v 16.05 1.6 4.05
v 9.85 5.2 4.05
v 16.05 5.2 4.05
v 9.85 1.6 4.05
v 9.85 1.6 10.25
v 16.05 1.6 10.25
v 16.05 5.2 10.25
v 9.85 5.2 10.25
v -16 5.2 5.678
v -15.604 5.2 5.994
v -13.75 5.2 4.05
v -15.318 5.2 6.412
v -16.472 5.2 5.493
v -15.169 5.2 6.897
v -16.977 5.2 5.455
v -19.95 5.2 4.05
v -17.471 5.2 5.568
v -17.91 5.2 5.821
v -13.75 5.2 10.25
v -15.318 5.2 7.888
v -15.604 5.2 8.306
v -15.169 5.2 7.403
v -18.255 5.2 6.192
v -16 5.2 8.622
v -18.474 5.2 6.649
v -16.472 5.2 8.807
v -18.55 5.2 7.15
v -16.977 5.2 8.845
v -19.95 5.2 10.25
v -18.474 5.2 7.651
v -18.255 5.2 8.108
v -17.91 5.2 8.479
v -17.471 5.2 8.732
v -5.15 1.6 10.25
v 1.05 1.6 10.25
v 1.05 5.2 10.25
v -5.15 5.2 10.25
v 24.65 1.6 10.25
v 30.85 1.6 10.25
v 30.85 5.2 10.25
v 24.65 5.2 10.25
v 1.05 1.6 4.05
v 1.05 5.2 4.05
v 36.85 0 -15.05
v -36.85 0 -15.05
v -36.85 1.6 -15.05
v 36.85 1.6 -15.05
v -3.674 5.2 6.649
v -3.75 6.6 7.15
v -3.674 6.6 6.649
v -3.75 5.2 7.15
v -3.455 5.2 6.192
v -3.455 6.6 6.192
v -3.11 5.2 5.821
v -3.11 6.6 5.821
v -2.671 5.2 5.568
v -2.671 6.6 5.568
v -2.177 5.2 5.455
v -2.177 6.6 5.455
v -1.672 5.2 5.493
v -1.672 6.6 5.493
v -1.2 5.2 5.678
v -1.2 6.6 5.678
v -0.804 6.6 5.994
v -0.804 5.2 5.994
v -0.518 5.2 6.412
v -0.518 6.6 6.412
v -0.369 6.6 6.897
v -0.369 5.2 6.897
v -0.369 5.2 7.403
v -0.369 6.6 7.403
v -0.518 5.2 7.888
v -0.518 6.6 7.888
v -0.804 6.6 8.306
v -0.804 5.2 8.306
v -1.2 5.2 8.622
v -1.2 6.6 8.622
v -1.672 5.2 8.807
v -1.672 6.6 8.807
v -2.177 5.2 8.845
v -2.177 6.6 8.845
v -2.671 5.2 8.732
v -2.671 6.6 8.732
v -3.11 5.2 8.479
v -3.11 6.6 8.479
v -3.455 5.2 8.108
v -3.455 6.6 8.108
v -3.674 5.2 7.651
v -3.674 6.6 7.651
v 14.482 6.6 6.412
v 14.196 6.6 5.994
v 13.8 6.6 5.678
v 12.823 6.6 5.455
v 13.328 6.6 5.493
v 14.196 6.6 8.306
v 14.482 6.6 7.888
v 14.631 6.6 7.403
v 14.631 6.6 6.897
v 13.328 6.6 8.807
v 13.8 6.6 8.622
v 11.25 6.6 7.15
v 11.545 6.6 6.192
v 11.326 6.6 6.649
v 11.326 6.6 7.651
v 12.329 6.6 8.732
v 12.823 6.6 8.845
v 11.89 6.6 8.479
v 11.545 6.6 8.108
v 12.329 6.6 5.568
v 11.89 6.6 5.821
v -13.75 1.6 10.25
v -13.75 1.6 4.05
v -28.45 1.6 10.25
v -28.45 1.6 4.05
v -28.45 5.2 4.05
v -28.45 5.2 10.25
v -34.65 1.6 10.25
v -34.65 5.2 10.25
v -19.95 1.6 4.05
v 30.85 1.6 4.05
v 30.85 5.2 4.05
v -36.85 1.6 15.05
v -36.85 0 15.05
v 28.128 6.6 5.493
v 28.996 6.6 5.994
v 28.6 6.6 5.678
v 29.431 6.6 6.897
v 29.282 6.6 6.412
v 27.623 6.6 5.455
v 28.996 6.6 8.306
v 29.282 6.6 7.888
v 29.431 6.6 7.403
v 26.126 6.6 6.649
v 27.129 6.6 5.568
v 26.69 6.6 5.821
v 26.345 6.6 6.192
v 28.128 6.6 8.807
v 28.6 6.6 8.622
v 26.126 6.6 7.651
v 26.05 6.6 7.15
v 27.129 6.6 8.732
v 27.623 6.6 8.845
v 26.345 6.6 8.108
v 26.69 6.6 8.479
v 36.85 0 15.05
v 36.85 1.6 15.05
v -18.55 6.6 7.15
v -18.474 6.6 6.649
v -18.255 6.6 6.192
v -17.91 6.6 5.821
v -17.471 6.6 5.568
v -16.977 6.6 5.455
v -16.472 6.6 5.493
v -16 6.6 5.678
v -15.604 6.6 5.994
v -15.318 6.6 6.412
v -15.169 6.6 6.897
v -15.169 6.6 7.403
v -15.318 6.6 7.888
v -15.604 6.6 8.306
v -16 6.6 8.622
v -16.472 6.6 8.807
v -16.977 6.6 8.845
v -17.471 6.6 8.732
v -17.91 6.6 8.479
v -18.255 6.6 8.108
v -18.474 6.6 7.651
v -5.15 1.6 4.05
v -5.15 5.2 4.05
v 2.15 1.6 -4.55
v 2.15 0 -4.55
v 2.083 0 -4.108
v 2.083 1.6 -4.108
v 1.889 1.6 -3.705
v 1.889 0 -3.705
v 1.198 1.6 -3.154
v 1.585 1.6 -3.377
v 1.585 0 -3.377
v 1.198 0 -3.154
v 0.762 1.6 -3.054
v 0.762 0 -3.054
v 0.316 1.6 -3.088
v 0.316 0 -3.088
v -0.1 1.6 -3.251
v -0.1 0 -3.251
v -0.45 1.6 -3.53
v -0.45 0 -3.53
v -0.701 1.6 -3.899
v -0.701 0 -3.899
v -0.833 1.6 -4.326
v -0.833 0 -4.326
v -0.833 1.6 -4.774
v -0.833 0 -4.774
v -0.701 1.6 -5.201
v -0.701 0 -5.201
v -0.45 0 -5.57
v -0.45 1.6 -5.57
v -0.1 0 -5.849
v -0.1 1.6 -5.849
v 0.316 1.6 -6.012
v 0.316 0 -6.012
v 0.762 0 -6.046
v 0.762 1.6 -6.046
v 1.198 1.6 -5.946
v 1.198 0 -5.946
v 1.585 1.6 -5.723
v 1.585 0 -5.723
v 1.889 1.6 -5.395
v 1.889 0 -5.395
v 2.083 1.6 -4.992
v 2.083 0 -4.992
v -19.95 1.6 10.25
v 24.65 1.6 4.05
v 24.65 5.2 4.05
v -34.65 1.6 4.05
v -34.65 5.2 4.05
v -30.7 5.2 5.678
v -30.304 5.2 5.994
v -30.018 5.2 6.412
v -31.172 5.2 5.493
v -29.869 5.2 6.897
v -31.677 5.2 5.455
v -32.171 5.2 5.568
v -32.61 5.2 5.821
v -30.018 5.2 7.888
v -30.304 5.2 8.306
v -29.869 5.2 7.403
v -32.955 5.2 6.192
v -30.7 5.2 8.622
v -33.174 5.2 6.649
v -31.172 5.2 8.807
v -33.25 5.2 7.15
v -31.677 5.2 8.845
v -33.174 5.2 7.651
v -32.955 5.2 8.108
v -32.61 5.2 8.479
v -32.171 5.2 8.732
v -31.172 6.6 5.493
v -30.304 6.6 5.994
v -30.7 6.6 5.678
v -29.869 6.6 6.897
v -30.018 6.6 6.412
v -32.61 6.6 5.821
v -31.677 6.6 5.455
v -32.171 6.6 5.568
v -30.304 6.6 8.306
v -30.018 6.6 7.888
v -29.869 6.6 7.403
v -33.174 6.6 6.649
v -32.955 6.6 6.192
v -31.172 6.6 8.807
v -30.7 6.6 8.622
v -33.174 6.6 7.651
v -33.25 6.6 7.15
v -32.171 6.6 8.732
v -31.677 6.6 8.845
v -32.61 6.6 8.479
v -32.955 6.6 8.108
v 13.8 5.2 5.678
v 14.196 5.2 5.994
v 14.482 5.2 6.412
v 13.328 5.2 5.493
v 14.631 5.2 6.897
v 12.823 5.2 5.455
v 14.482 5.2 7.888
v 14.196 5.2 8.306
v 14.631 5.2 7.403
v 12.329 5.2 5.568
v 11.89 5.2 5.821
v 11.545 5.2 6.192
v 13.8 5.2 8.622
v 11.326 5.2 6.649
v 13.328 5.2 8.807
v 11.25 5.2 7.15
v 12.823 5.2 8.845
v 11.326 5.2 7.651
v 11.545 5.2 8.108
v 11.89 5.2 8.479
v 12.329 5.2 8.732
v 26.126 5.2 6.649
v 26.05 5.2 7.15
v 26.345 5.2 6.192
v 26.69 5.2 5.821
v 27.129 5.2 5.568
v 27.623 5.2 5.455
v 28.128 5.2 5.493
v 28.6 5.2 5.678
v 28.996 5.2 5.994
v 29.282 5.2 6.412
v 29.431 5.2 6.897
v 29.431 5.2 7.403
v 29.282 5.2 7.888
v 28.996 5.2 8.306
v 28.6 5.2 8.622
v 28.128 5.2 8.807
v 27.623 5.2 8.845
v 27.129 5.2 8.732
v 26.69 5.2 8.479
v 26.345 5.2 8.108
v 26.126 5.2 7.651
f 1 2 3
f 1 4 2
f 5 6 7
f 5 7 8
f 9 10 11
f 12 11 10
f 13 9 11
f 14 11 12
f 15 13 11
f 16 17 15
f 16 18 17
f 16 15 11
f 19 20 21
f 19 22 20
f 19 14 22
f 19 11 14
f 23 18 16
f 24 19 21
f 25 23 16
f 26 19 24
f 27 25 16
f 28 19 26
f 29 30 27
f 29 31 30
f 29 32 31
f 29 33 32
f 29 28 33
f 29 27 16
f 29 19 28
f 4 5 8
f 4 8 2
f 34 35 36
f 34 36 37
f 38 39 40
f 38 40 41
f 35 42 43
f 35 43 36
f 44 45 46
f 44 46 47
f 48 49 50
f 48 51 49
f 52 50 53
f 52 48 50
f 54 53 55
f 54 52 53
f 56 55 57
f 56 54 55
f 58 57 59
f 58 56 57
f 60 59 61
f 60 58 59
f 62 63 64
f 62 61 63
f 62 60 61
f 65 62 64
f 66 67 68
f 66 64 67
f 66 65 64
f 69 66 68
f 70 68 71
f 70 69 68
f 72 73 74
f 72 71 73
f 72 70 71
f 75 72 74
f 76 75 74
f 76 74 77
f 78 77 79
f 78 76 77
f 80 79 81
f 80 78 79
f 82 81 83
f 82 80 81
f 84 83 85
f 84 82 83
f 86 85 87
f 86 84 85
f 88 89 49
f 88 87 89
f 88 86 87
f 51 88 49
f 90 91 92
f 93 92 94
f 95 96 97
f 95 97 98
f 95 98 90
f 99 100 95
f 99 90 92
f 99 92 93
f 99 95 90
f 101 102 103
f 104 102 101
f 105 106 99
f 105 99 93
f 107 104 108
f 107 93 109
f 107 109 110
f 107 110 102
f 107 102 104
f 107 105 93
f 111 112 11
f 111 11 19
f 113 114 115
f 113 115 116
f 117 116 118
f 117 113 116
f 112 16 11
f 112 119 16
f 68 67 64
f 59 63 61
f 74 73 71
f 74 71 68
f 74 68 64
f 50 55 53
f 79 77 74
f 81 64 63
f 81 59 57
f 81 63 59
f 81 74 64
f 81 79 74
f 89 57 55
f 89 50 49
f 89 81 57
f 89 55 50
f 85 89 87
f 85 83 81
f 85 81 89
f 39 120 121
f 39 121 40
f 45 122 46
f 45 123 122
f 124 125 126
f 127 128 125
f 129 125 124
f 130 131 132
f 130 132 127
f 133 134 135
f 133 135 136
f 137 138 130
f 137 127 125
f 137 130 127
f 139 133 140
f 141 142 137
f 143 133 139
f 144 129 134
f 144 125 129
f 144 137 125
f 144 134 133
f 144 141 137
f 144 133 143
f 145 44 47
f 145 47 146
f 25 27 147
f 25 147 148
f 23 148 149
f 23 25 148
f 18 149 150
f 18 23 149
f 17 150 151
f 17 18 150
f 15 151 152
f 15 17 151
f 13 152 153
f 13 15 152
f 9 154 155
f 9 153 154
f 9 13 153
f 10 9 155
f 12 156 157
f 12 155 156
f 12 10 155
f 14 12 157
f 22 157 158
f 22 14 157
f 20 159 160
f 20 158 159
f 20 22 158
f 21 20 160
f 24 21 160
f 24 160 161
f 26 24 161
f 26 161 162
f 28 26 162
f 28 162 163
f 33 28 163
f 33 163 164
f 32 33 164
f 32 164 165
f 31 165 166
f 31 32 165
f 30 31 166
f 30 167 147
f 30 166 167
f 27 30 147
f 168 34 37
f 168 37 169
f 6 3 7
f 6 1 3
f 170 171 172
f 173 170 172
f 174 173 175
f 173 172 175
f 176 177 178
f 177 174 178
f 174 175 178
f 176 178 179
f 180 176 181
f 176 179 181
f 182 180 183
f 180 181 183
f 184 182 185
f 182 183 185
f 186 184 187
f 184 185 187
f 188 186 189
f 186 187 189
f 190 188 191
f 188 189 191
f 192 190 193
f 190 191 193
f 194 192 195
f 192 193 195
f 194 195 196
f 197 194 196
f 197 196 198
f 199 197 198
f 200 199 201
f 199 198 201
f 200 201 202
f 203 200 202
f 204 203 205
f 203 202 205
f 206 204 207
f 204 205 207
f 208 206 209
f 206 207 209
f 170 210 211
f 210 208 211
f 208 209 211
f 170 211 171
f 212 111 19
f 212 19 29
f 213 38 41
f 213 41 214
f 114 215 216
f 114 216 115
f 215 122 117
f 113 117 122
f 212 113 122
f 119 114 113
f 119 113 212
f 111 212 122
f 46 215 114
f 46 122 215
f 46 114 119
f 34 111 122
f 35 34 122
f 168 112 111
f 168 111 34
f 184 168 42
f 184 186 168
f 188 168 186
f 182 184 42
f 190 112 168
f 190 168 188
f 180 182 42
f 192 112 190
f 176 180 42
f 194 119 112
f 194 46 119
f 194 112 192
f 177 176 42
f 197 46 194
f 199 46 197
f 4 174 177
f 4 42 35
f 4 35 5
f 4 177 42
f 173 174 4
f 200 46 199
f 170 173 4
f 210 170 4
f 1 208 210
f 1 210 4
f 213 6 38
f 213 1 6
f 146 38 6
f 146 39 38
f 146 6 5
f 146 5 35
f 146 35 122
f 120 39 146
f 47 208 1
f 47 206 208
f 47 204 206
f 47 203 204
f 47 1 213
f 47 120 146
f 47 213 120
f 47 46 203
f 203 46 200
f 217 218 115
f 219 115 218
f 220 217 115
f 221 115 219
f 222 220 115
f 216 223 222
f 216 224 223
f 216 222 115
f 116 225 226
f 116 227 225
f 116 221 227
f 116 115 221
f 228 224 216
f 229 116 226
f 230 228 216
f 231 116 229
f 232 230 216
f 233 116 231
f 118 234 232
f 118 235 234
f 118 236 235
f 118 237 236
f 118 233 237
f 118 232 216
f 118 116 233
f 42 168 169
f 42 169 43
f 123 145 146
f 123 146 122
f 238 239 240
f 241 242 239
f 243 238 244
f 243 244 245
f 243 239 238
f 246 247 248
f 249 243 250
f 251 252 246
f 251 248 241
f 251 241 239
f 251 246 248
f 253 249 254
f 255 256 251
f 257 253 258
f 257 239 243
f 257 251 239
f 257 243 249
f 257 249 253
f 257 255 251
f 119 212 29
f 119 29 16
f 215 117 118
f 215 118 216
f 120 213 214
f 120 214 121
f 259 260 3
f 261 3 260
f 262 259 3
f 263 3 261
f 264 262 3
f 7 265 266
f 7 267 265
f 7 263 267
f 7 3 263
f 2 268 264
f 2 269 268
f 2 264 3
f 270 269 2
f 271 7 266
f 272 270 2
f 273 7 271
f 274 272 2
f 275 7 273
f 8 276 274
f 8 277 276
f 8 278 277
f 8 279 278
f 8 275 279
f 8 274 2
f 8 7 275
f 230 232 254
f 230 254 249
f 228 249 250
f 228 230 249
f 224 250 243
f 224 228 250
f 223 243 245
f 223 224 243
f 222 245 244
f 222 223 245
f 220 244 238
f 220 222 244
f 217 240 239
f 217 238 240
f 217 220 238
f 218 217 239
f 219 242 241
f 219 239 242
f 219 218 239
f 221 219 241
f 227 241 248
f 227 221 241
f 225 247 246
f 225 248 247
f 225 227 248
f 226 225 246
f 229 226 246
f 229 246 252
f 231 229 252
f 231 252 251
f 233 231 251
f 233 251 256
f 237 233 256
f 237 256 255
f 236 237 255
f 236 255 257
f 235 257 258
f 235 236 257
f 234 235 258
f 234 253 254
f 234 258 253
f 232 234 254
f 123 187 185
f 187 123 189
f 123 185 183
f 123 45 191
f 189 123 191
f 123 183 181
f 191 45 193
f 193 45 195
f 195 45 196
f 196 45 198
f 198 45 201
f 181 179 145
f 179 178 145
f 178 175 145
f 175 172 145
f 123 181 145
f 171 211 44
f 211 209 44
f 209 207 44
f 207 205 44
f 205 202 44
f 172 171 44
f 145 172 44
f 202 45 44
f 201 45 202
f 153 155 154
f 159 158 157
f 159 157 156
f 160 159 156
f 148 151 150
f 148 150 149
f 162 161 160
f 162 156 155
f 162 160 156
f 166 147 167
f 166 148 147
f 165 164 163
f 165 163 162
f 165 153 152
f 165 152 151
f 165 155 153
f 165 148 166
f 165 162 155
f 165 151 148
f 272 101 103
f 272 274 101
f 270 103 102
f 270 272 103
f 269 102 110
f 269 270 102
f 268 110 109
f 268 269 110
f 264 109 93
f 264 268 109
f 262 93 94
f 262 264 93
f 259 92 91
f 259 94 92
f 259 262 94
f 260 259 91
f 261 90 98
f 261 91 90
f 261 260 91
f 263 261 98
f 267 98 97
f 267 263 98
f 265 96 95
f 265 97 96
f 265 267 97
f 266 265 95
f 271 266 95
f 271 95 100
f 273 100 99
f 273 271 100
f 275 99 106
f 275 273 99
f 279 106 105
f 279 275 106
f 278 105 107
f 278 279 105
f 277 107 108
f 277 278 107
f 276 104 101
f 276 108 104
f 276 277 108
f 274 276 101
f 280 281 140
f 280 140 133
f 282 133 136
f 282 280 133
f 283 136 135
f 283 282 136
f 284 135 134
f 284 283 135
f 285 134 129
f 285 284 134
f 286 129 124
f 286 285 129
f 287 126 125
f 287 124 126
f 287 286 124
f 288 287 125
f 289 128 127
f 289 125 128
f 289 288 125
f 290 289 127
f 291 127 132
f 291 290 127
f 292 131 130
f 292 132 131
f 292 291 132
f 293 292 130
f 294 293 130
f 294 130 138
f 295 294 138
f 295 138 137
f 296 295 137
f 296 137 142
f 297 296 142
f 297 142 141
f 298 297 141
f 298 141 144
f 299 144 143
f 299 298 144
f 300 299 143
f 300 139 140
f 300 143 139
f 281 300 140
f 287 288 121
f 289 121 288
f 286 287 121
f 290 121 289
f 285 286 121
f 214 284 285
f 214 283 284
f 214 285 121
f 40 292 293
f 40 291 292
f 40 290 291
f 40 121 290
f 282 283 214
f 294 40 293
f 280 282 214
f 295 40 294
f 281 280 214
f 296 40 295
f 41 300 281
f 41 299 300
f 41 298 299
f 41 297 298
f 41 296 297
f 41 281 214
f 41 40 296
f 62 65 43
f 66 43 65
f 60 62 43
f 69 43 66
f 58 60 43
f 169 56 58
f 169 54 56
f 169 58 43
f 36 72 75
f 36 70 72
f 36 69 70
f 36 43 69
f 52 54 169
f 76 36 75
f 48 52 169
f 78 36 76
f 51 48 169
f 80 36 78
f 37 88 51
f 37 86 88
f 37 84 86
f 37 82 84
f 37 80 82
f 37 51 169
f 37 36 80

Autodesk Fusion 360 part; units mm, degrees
sketch "Эскиз1" plane through (0, 0, 0) normal (0, 1, 0) x (1, 0, 0)
  line L0 (36.85, -15.05) -> (-36.85, -15.05)
  line L1 (-36.85, -15.05) -> (-36.85, 15.05)
  line L2 (-36.85, 15.05) -> (36.85, 15.05)
  line L3 (36.85, 15.05) -> (36.85, -15.05)
  line L4 (36.85, -15.05) -> (-36.85, 15.05) construction
  line L5 (-36.85, -15.05) -> (36.85, 15.05) construction
  circle A0 centre (0.65, 4.55) radius 1.5
  dimension "d1" = 73.7
  dimension "d2" = 30.1
  dimension "d3" = 3
  dimension "d4" = 37.5
  dimension "d5" = 10.5
extrude "Выдавливание2" add sketch "Эскиз1" along normal blind 1.6
sketch "Эскиз2" plane through (0, 1.6, 0) normal (0, 1, 0) x (-1, 0, 0)
  line L0 (34.65, 4.05) -> (28.45, 4.05)
  line L1 (28.45, 4.05) -> (28.45, 10.25)
  line L2 (28.45, 10.25) -> (34.65, 10.25)
  line L3 (34.65, 10.25) -> (34.65, 4.05)
  circle A0 centre (-0.65, -4.55) radius 1.5
  circle A1 centre (-0.65, -4.55) radius 1.5
  line L4 (-36.85, -15.05) -> (36.85, -15.05)
  line L5 (36.85, -15.05) -> (36.85, 15.05)
  line L6 (36.85, 15.05) -> (-36.85, 15.05)
  line L7 (-36.85, 15.05) -> (-36.85, -15.05)
  line L8 (19.95, 4.05) -> (13.75, 4.05)
  line L9 (19.95, 10.25) -> (19.95, 4.05)
  line L10 (13.75, 10.25) -> (19.95, 10.25)
  line L11 (13.75, 4.05) -> (13.75, 10.25)
  line L12 (5.15, 4.05) -> (-1.05, 4.05)
  line L13 (5.15, 10.25) -> (5.15, 4.05)
  line L14 (-1.05, 10.25) -> (5.15, 10.25)
  line L15 (-1.05, 4.05) -> (-1.05, 10.25)
  line L16 (-9.85, 4.05) -> (-16.05, 4.05)
  line L17 (-9.85, 10.25) -> (-9.85, 4.05)
  line L18 (-16.05, 4.05) -> (-16.05, 10.25)
  line L19 (-16.05, 10.25) -> (-9.85, 10.25)
  line L20 (-24.65, 4.05) -> (-30.85, 4.05)
  line L21 (-24.65, 10.25) -> (-24.65, 4.05)
  line L22 (-30.85, 4.05) -> (-30.85, 10.25)
  line L23 (-30.85, 10.25) -> (-24.65, 10.25)
  dimension "d8" = 6.2
  dimension "d9" = 6.2
  dimension "d18" = 2.2
  dimension "d19" = 4.8
  dimension "d20" = 6.2
  dimension "d21" = 6.2
  dimension "d22" = 8.5
  dimension "d23" = 6.2
  dimension "d24" = 6.2
  dimension "d25" = 8.6
  dimension "d26" = 6.2
  dimension "d27" = 6.2
  dimension "d28" = 6.2
  dimension "d29" = 6.2
  dimension "d30" = 8.6
  dimension "d31" = 8.8
  dimension "d32" = 65.5
  dimension "d33" = 21
  dimension "d34" = 21.2
  dimension "d35" = 21
  dimension "d36" = 20.9
  dimension "d37" = 6
extrude "Выдавливание3" add sketch "Эскиз2" along normal blind 3.6 contours L0 L1 L2 L3 | L8 L9 L10 L11 | L12 L13 L14 L15 | L16 L17 L18 L19 | L20 L21 L22 L23
sketch "Эскиз3" plane through (0, 5.2, 0) normal (0, 1, 0) x (-1, 0, 0)
  line L0 (34.65, 10.25) -> (28.45, 10.25)
  line L1 (28.45, 10.25) -> (28.45, 4.05)
  line L2 (28.45, 4.05) -> (34.65, 4.05)
  line L3 (34.65, 4.05) -> (34.65, 10.25)
  line L4 (13.75, 4.05) -> (19.95, 4.05)
  line L5 (19.95, 4.05) -> (19.95, 10.25)
  line L6 (19.95, 10.25) -> (13.75, 10.25)
  line L7 (13.75, 10.25) -> (13.75, 4.05)
  line L8 (-1.05, 4.05) -> (5.15, 4.05)
  line L9 (5.15, 4.05) -> (5.15, 10.25)
  line L10 (5.15, 10.25) -> (-1.05, 10.25)
  line L11 (-1.05, 10.25) -> (-1.05, 4.05)
  line L12 (-16.05, 10.25) -> (-16.05, 4.05)
  line L13 (-16.05, 4.05) -> (-9.85, 4.05)
  line L14 (-9.85, 4.05) -> (-9.85, 10.25)
  line L15 (-9.85, 10.25) -> (-16.05, 10.25)
  line L16 (-30.85, 10.25) -> (-30.85, 4.05)
  line L17 (-30.85, 4.05) -> (-24.65, 4.05)
  line L18 (-24.65, 4.05) -> (-24.65, 10.25)
  line L19 (-24.65, 10.25) -> (-30.85, 10.25)
  circle A0 centre (31.55, 7.15) radius 1.7
  circle A1 centre (16.85, 7.15) radius 1.7
  circle A2 centre (2.05, 7.15) radius 1.7
  circle A3 centre (-12.95, 7.15) radius 1.7
  circle A4 centre (-27.75, 7.15) radius 1.7
  dimension "d40" = 3.4
  dimension "d41" = 3.4
  dimension "d42" = 3.4
  dimension "d43" = 3.4
  dimension "d44" = 3.4
extrude "Выдавливание4" add sketch "Эскиз3" along normal blind 1.4 contours A0 | A1 | A2 | A3 | A4
